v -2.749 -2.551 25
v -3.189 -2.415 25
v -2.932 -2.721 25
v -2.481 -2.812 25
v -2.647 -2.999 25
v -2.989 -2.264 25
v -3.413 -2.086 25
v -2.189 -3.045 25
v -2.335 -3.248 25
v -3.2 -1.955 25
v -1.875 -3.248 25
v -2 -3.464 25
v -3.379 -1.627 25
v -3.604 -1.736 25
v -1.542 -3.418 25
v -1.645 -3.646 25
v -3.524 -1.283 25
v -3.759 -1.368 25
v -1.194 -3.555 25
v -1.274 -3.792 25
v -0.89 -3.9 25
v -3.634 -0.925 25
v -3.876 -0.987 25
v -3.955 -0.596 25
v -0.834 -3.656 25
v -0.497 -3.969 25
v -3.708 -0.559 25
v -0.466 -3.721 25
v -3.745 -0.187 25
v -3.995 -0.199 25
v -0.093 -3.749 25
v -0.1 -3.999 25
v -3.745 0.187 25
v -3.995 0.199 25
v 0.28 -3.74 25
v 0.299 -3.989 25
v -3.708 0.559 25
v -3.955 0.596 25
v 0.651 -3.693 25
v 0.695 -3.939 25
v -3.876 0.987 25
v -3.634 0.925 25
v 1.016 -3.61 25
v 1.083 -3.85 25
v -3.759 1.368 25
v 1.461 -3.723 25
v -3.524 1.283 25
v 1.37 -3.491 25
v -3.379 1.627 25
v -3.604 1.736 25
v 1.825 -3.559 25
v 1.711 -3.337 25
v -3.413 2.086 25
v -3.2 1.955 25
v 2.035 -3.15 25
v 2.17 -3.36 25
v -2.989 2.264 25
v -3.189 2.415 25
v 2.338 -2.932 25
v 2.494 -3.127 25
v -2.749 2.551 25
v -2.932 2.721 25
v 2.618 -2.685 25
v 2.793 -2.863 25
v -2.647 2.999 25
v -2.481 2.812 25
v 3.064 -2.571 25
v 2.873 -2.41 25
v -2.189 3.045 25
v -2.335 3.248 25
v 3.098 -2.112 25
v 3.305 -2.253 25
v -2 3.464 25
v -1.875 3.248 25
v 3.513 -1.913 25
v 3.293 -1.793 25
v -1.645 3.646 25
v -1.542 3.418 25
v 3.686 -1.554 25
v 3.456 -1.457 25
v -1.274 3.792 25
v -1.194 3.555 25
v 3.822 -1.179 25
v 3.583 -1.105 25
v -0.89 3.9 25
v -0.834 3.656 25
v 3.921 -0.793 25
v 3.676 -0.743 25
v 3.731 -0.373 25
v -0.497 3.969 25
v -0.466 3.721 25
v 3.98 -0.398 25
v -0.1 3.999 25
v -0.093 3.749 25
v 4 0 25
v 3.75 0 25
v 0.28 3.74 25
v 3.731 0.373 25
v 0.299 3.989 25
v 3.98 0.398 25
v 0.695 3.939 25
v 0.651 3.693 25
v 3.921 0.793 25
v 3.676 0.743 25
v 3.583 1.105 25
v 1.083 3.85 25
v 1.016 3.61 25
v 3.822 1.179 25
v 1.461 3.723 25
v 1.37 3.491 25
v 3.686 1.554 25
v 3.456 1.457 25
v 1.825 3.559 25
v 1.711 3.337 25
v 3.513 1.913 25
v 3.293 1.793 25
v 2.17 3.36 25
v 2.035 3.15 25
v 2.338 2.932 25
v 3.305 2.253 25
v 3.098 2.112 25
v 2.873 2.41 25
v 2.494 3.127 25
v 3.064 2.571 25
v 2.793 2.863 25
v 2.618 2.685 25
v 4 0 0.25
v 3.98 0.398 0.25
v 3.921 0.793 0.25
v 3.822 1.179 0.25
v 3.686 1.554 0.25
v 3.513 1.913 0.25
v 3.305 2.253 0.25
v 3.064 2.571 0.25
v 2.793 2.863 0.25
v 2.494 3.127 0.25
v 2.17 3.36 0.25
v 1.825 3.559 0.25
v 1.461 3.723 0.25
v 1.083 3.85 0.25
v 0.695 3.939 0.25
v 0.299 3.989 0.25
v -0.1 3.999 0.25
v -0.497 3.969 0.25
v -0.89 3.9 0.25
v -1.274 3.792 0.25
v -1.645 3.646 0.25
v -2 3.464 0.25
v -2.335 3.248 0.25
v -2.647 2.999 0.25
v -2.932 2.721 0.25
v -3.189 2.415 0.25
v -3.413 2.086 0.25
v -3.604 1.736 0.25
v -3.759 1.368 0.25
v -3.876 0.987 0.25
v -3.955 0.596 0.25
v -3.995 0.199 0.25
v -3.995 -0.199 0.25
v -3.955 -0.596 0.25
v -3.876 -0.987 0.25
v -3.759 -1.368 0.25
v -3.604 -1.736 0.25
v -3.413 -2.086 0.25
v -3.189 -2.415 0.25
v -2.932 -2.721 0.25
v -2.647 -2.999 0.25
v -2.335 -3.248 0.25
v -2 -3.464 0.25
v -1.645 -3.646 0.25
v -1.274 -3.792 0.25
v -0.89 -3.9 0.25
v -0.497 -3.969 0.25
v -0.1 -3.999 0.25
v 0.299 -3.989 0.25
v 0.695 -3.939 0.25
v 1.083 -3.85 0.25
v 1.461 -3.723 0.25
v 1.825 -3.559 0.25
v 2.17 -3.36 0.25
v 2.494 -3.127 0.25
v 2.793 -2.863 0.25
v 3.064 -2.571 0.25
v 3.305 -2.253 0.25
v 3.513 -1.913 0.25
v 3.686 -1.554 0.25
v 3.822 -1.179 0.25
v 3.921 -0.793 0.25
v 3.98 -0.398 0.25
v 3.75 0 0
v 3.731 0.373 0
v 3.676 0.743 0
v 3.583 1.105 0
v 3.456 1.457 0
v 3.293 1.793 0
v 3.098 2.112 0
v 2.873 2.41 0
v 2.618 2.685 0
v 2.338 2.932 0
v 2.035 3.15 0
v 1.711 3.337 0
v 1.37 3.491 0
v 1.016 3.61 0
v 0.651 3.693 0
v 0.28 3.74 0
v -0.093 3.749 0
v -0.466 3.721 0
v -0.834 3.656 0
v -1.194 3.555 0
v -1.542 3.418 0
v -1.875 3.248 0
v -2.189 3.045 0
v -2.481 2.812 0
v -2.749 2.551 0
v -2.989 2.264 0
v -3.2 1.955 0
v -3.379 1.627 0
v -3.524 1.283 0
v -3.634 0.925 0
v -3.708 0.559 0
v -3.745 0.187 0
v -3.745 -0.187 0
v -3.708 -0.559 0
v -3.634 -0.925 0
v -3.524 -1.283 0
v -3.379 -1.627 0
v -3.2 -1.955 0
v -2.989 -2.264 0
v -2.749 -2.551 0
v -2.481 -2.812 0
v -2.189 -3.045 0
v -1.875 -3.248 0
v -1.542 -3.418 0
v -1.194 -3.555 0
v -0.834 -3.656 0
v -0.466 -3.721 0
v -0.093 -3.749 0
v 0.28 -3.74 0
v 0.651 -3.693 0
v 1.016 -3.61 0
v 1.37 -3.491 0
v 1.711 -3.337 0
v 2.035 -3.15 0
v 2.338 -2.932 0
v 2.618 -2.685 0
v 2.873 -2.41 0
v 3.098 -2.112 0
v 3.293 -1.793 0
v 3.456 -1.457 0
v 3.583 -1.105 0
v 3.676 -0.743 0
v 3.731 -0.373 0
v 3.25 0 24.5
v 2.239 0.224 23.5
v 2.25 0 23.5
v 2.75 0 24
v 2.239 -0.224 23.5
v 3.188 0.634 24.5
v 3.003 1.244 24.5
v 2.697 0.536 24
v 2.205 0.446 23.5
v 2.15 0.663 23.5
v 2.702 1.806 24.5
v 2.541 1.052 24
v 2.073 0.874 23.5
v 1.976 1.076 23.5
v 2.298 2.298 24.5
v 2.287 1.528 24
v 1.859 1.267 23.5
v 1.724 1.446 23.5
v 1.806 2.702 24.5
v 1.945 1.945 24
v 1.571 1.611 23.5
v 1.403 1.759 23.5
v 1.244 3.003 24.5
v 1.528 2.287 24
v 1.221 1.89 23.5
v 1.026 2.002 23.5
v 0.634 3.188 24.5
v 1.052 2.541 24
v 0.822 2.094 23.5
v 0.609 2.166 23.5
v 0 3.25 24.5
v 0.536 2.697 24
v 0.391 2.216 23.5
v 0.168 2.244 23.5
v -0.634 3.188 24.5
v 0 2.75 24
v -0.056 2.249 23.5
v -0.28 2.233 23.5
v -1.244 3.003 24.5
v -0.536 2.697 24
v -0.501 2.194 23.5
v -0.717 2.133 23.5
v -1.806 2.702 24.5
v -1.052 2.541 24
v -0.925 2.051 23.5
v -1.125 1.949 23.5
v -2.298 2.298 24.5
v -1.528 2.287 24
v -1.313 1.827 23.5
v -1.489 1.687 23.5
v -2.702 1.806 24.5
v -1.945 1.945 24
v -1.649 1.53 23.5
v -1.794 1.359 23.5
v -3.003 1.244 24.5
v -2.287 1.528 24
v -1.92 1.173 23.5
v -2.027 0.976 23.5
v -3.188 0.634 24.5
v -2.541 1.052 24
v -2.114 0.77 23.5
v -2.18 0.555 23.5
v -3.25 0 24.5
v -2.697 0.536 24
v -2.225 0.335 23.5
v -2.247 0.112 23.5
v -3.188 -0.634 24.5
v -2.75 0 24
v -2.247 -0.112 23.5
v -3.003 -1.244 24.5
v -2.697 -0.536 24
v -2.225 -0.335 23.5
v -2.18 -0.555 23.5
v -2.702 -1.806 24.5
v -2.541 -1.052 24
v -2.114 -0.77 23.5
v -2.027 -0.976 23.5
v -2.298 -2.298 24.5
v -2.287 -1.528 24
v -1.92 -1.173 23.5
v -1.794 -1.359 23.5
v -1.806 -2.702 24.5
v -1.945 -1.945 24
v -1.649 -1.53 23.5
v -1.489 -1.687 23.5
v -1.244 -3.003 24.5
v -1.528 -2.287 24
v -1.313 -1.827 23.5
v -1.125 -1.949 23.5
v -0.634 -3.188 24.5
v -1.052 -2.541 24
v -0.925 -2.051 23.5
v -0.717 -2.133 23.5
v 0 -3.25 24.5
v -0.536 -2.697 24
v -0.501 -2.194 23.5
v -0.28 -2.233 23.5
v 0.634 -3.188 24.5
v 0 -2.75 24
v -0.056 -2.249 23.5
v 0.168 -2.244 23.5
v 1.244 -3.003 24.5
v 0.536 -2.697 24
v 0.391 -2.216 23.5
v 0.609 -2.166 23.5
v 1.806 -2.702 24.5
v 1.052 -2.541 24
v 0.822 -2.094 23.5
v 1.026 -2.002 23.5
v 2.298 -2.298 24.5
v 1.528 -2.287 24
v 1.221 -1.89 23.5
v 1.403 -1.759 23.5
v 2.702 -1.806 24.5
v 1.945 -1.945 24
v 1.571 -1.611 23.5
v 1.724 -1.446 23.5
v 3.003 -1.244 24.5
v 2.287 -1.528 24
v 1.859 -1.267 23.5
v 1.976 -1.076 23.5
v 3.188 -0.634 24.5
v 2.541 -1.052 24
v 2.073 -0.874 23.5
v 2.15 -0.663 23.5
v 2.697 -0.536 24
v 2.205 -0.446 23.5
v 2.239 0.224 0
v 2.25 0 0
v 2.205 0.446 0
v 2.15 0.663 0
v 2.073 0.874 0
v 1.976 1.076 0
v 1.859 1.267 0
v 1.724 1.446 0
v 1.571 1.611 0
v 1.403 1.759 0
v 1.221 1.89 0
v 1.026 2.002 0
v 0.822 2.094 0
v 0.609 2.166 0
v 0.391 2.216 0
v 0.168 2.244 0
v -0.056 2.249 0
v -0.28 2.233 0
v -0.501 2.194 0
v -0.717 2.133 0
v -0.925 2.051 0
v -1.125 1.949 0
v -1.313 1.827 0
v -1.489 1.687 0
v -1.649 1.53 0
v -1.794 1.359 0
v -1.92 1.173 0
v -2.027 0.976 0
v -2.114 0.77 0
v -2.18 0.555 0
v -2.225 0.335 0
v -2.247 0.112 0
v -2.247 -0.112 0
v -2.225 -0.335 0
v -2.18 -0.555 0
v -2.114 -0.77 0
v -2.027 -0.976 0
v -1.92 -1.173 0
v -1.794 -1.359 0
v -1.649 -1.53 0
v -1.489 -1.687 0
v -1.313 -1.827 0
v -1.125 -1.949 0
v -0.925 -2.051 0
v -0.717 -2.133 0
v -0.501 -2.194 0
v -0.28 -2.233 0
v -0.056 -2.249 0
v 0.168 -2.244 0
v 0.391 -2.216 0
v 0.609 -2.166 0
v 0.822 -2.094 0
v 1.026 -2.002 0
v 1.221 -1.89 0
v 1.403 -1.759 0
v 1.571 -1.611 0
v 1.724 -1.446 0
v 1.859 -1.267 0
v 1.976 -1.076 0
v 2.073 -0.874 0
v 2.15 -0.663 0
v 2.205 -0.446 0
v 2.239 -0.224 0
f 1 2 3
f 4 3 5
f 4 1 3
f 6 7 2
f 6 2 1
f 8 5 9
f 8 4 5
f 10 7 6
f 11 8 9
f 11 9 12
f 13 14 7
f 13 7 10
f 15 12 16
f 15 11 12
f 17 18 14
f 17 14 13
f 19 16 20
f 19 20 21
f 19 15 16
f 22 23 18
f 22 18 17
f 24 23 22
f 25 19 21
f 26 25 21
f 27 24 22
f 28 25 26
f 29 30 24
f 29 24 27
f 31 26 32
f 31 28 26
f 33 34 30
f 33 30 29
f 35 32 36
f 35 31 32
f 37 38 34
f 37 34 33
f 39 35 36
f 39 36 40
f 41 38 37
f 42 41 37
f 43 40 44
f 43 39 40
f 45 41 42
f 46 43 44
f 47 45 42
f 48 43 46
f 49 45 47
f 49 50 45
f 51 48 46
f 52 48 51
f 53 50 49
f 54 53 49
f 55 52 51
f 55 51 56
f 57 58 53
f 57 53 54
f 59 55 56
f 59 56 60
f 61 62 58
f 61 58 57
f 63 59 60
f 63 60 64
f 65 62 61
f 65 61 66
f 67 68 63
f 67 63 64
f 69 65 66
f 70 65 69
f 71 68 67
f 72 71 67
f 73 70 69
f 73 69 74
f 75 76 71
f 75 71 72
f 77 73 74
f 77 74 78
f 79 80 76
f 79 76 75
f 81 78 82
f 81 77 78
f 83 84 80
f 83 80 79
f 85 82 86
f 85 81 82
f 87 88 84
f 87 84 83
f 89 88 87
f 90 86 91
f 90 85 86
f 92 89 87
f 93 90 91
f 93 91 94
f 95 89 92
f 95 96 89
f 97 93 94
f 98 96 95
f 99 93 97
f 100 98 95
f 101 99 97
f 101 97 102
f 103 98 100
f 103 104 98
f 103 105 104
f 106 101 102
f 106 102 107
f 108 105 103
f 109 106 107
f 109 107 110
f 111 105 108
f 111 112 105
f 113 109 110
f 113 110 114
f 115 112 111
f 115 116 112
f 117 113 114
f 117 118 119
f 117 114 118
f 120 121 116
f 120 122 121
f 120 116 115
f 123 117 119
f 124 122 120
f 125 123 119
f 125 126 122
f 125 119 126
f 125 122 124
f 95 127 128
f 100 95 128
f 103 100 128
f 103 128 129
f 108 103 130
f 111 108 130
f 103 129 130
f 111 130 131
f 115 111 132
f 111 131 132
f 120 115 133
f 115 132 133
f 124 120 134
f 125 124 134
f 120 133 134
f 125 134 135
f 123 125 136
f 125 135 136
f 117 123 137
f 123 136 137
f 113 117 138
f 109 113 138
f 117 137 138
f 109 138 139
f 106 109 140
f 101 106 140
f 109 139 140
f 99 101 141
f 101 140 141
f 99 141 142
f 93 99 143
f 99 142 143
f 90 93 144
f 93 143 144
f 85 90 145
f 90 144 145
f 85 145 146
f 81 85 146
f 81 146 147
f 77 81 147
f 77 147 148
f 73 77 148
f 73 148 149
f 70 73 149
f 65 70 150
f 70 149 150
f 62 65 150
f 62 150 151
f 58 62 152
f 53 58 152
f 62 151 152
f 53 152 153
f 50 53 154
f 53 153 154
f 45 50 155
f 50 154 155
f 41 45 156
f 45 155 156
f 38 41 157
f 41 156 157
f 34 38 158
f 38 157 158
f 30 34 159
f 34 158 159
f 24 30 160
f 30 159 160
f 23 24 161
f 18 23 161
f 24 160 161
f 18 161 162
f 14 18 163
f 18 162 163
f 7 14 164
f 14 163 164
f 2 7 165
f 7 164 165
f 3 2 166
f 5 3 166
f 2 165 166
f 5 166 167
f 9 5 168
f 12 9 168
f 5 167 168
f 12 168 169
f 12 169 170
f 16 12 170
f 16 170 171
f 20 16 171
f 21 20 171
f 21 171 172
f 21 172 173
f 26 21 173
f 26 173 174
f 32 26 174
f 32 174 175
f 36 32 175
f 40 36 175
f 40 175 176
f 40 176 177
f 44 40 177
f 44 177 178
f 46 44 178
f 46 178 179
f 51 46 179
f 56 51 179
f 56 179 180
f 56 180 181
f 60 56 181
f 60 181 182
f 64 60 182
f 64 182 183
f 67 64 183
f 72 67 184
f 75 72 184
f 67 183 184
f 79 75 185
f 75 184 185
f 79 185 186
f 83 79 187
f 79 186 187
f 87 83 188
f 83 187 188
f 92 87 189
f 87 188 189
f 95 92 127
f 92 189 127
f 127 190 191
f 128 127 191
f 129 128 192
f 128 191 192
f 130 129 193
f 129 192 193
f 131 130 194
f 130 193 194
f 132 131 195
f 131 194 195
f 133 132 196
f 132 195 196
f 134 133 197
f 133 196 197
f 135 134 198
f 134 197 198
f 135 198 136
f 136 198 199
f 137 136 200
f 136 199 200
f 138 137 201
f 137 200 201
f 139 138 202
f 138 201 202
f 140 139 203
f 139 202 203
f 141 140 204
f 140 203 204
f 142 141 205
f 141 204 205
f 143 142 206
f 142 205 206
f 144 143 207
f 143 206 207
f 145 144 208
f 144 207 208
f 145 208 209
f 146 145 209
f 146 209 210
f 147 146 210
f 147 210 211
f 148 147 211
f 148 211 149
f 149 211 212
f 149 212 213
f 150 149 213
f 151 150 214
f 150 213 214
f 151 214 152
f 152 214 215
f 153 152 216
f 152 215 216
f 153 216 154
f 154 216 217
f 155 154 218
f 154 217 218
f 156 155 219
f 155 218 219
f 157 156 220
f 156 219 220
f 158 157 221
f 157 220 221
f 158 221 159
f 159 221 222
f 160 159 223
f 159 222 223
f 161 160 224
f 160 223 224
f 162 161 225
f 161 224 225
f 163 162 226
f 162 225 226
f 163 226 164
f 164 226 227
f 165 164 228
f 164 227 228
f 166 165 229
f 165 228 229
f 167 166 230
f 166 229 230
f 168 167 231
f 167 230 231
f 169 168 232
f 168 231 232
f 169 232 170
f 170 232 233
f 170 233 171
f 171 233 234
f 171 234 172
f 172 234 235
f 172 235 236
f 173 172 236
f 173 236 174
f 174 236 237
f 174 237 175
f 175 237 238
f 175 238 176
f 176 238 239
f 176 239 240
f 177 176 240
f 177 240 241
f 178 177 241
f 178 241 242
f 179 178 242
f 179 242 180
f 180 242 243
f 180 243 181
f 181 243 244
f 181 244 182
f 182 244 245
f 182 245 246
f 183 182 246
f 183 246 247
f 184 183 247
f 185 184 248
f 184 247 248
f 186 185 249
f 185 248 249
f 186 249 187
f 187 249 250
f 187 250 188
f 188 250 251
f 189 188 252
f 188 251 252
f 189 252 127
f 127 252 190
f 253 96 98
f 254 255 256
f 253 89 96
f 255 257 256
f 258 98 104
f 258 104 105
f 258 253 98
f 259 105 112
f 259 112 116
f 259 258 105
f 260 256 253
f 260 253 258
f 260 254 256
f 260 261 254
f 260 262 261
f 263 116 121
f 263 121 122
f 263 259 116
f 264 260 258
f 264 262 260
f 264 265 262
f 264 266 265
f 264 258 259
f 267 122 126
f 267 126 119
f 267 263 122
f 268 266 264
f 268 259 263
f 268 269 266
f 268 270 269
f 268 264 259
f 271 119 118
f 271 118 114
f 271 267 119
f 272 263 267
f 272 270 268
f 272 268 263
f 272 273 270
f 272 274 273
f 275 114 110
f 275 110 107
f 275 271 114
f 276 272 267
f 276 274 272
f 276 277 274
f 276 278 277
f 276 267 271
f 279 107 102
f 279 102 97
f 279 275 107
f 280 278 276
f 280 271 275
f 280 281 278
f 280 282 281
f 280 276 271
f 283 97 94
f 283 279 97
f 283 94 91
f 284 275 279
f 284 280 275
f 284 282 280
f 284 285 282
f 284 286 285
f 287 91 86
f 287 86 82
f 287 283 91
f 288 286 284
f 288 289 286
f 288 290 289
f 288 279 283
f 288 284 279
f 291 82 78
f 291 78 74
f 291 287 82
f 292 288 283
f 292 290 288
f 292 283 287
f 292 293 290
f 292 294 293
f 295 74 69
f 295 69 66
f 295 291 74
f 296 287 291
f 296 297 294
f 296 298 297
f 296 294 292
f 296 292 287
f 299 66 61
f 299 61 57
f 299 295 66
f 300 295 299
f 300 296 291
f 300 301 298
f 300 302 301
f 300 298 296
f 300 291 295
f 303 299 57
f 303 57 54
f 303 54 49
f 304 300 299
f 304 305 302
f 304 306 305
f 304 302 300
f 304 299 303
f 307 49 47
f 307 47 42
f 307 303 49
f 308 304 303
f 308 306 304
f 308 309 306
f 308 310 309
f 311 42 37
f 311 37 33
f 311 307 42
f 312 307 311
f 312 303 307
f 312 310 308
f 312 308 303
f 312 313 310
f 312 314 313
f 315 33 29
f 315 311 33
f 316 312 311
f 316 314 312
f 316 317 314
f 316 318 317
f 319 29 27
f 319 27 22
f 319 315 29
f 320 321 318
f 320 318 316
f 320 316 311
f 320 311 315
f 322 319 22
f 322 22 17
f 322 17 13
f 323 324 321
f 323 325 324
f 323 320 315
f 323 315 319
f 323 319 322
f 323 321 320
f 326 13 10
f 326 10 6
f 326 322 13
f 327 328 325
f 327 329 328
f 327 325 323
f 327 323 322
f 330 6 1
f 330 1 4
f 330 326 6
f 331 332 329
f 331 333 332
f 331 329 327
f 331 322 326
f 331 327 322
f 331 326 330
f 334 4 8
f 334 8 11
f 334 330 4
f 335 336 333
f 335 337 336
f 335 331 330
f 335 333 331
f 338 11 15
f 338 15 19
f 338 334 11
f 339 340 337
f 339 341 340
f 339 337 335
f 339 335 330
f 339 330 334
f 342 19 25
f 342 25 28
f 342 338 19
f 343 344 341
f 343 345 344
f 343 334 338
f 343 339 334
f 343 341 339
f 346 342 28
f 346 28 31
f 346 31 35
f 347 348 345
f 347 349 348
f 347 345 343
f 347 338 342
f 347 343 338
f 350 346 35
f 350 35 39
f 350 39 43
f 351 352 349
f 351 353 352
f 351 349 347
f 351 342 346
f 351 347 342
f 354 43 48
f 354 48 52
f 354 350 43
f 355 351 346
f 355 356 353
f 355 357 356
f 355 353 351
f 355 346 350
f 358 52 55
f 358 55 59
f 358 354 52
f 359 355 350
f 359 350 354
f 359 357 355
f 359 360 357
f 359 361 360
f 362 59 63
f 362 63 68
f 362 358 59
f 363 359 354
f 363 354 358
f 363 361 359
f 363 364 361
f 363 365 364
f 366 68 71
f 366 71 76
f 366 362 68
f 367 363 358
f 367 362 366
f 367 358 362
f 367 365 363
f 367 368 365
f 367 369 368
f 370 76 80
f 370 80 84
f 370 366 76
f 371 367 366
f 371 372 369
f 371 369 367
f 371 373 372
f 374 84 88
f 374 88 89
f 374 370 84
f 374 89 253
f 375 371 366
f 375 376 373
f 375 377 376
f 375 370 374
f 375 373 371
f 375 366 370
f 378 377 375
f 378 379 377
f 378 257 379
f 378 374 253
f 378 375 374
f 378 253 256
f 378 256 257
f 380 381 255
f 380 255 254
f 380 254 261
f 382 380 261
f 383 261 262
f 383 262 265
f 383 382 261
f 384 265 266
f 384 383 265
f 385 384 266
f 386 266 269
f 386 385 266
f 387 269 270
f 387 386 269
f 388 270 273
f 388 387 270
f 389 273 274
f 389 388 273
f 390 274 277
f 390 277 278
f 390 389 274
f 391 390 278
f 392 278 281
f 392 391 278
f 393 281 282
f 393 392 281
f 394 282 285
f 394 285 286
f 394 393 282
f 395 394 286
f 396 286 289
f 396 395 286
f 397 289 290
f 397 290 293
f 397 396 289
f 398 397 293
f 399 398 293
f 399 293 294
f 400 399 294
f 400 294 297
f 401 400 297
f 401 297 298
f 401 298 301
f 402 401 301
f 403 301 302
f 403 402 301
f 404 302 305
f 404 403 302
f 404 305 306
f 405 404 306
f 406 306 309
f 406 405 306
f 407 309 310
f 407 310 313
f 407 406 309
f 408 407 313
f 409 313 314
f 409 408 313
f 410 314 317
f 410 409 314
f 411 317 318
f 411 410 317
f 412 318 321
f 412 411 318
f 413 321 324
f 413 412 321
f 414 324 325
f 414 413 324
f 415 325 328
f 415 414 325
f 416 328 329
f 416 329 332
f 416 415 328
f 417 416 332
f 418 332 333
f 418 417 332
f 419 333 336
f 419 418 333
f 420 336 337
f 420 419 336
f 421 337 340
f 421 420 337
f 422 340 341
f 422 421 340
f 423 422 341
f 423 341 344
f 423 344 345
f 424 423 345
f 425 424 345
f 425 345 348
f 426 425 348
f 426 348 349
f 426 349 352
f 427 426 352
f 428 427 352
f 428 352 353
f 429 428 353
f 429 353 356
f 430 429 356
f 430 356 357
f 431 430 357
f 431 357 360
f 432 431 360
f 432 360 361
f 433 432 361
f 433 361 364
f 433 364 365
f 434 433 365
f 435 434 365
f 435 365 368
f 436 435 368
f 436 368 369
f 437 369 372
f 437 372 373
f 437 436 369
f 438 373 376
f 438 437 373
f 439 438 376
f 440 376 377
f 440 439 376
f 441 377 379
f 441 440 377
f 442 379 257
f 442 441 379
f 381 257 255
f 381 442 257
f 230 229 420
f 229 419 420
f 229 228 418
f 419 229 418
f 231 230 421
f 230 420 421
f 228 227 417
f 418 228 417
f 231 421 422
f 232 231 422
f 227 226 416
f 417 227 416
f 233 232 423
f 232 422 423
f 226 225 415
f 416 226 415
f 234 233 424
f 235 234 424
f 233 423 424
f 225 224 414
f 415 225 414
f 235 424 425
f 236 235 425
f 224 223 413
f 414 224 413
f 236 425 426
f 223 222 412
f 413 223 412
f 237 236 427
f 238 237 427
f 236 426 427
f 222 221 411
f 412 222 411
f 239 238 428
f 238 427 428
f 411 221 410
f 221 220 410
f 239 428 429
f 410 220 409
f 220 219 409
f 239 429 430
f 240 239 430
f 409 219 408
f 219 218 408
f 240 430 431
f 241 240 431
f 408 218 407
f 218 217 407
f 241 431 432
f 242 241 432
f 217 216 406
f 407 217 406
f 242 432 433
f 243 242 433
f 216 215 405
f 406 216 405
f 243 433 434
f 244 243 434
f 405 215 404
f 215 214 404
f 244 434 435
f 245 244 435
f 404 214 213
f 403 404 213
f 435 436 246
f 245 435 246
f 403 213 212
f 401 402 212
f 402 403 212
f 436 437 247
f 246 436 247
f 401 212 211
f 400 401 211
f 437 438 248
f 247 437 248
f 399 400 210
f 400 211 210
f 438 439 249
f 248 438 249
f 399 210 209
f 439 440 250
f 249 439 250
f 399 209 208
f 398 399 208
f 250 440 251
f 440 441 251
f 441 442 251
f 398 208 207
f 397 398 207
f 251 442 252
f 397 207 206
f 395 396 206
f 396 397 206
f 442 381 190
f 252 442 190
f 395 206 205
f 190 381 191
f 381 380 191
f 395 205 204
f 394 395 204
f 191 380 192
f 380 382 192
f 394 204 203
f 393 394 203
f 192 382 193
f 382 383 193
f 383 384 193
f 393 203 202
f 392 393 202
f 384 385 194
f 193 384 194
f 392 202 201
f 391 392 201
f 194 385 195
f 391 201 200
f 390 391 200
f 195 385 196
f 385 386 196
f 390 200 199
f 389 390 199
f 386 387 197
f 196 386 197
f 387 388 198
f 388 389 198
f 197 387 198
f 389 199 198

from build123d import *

# Parameters (mm, degrees)
SKETCH_R        = 4
SKETCH_R_2      = 2.25
PAD_DEPTH       = 25
CHAMFER_SIZE    = 0.25
CHAMFER001_SIZE = 1.5


with BuildPart() as part:
    # Sketch → Pad (new body)
    with BuildSketch(Plane.XY):
        Circle(SKETCH_R)
        Circle(SKETCH_R_2, mode=Mode.SUBTRACT)
    extrude(amount=PAD_DEPTH)

    # Chamfer
    chamfer_edges = [part.edges().sort_by_distance(p)[0] for p in [
        (-4, 0, 0),
    ]]
    chamfer(chamfer_edges, length=CHAMFER_SIZE)

    # Chamfer001
    chamfer001_edges = [part.edges().sort_by_distance(p)[0] for p in [
        (-2.25, 0, 25),
    ]]
    chamfer(chamfer001_edges, length=CHAMFER001_SIZE)


solid = part.part
